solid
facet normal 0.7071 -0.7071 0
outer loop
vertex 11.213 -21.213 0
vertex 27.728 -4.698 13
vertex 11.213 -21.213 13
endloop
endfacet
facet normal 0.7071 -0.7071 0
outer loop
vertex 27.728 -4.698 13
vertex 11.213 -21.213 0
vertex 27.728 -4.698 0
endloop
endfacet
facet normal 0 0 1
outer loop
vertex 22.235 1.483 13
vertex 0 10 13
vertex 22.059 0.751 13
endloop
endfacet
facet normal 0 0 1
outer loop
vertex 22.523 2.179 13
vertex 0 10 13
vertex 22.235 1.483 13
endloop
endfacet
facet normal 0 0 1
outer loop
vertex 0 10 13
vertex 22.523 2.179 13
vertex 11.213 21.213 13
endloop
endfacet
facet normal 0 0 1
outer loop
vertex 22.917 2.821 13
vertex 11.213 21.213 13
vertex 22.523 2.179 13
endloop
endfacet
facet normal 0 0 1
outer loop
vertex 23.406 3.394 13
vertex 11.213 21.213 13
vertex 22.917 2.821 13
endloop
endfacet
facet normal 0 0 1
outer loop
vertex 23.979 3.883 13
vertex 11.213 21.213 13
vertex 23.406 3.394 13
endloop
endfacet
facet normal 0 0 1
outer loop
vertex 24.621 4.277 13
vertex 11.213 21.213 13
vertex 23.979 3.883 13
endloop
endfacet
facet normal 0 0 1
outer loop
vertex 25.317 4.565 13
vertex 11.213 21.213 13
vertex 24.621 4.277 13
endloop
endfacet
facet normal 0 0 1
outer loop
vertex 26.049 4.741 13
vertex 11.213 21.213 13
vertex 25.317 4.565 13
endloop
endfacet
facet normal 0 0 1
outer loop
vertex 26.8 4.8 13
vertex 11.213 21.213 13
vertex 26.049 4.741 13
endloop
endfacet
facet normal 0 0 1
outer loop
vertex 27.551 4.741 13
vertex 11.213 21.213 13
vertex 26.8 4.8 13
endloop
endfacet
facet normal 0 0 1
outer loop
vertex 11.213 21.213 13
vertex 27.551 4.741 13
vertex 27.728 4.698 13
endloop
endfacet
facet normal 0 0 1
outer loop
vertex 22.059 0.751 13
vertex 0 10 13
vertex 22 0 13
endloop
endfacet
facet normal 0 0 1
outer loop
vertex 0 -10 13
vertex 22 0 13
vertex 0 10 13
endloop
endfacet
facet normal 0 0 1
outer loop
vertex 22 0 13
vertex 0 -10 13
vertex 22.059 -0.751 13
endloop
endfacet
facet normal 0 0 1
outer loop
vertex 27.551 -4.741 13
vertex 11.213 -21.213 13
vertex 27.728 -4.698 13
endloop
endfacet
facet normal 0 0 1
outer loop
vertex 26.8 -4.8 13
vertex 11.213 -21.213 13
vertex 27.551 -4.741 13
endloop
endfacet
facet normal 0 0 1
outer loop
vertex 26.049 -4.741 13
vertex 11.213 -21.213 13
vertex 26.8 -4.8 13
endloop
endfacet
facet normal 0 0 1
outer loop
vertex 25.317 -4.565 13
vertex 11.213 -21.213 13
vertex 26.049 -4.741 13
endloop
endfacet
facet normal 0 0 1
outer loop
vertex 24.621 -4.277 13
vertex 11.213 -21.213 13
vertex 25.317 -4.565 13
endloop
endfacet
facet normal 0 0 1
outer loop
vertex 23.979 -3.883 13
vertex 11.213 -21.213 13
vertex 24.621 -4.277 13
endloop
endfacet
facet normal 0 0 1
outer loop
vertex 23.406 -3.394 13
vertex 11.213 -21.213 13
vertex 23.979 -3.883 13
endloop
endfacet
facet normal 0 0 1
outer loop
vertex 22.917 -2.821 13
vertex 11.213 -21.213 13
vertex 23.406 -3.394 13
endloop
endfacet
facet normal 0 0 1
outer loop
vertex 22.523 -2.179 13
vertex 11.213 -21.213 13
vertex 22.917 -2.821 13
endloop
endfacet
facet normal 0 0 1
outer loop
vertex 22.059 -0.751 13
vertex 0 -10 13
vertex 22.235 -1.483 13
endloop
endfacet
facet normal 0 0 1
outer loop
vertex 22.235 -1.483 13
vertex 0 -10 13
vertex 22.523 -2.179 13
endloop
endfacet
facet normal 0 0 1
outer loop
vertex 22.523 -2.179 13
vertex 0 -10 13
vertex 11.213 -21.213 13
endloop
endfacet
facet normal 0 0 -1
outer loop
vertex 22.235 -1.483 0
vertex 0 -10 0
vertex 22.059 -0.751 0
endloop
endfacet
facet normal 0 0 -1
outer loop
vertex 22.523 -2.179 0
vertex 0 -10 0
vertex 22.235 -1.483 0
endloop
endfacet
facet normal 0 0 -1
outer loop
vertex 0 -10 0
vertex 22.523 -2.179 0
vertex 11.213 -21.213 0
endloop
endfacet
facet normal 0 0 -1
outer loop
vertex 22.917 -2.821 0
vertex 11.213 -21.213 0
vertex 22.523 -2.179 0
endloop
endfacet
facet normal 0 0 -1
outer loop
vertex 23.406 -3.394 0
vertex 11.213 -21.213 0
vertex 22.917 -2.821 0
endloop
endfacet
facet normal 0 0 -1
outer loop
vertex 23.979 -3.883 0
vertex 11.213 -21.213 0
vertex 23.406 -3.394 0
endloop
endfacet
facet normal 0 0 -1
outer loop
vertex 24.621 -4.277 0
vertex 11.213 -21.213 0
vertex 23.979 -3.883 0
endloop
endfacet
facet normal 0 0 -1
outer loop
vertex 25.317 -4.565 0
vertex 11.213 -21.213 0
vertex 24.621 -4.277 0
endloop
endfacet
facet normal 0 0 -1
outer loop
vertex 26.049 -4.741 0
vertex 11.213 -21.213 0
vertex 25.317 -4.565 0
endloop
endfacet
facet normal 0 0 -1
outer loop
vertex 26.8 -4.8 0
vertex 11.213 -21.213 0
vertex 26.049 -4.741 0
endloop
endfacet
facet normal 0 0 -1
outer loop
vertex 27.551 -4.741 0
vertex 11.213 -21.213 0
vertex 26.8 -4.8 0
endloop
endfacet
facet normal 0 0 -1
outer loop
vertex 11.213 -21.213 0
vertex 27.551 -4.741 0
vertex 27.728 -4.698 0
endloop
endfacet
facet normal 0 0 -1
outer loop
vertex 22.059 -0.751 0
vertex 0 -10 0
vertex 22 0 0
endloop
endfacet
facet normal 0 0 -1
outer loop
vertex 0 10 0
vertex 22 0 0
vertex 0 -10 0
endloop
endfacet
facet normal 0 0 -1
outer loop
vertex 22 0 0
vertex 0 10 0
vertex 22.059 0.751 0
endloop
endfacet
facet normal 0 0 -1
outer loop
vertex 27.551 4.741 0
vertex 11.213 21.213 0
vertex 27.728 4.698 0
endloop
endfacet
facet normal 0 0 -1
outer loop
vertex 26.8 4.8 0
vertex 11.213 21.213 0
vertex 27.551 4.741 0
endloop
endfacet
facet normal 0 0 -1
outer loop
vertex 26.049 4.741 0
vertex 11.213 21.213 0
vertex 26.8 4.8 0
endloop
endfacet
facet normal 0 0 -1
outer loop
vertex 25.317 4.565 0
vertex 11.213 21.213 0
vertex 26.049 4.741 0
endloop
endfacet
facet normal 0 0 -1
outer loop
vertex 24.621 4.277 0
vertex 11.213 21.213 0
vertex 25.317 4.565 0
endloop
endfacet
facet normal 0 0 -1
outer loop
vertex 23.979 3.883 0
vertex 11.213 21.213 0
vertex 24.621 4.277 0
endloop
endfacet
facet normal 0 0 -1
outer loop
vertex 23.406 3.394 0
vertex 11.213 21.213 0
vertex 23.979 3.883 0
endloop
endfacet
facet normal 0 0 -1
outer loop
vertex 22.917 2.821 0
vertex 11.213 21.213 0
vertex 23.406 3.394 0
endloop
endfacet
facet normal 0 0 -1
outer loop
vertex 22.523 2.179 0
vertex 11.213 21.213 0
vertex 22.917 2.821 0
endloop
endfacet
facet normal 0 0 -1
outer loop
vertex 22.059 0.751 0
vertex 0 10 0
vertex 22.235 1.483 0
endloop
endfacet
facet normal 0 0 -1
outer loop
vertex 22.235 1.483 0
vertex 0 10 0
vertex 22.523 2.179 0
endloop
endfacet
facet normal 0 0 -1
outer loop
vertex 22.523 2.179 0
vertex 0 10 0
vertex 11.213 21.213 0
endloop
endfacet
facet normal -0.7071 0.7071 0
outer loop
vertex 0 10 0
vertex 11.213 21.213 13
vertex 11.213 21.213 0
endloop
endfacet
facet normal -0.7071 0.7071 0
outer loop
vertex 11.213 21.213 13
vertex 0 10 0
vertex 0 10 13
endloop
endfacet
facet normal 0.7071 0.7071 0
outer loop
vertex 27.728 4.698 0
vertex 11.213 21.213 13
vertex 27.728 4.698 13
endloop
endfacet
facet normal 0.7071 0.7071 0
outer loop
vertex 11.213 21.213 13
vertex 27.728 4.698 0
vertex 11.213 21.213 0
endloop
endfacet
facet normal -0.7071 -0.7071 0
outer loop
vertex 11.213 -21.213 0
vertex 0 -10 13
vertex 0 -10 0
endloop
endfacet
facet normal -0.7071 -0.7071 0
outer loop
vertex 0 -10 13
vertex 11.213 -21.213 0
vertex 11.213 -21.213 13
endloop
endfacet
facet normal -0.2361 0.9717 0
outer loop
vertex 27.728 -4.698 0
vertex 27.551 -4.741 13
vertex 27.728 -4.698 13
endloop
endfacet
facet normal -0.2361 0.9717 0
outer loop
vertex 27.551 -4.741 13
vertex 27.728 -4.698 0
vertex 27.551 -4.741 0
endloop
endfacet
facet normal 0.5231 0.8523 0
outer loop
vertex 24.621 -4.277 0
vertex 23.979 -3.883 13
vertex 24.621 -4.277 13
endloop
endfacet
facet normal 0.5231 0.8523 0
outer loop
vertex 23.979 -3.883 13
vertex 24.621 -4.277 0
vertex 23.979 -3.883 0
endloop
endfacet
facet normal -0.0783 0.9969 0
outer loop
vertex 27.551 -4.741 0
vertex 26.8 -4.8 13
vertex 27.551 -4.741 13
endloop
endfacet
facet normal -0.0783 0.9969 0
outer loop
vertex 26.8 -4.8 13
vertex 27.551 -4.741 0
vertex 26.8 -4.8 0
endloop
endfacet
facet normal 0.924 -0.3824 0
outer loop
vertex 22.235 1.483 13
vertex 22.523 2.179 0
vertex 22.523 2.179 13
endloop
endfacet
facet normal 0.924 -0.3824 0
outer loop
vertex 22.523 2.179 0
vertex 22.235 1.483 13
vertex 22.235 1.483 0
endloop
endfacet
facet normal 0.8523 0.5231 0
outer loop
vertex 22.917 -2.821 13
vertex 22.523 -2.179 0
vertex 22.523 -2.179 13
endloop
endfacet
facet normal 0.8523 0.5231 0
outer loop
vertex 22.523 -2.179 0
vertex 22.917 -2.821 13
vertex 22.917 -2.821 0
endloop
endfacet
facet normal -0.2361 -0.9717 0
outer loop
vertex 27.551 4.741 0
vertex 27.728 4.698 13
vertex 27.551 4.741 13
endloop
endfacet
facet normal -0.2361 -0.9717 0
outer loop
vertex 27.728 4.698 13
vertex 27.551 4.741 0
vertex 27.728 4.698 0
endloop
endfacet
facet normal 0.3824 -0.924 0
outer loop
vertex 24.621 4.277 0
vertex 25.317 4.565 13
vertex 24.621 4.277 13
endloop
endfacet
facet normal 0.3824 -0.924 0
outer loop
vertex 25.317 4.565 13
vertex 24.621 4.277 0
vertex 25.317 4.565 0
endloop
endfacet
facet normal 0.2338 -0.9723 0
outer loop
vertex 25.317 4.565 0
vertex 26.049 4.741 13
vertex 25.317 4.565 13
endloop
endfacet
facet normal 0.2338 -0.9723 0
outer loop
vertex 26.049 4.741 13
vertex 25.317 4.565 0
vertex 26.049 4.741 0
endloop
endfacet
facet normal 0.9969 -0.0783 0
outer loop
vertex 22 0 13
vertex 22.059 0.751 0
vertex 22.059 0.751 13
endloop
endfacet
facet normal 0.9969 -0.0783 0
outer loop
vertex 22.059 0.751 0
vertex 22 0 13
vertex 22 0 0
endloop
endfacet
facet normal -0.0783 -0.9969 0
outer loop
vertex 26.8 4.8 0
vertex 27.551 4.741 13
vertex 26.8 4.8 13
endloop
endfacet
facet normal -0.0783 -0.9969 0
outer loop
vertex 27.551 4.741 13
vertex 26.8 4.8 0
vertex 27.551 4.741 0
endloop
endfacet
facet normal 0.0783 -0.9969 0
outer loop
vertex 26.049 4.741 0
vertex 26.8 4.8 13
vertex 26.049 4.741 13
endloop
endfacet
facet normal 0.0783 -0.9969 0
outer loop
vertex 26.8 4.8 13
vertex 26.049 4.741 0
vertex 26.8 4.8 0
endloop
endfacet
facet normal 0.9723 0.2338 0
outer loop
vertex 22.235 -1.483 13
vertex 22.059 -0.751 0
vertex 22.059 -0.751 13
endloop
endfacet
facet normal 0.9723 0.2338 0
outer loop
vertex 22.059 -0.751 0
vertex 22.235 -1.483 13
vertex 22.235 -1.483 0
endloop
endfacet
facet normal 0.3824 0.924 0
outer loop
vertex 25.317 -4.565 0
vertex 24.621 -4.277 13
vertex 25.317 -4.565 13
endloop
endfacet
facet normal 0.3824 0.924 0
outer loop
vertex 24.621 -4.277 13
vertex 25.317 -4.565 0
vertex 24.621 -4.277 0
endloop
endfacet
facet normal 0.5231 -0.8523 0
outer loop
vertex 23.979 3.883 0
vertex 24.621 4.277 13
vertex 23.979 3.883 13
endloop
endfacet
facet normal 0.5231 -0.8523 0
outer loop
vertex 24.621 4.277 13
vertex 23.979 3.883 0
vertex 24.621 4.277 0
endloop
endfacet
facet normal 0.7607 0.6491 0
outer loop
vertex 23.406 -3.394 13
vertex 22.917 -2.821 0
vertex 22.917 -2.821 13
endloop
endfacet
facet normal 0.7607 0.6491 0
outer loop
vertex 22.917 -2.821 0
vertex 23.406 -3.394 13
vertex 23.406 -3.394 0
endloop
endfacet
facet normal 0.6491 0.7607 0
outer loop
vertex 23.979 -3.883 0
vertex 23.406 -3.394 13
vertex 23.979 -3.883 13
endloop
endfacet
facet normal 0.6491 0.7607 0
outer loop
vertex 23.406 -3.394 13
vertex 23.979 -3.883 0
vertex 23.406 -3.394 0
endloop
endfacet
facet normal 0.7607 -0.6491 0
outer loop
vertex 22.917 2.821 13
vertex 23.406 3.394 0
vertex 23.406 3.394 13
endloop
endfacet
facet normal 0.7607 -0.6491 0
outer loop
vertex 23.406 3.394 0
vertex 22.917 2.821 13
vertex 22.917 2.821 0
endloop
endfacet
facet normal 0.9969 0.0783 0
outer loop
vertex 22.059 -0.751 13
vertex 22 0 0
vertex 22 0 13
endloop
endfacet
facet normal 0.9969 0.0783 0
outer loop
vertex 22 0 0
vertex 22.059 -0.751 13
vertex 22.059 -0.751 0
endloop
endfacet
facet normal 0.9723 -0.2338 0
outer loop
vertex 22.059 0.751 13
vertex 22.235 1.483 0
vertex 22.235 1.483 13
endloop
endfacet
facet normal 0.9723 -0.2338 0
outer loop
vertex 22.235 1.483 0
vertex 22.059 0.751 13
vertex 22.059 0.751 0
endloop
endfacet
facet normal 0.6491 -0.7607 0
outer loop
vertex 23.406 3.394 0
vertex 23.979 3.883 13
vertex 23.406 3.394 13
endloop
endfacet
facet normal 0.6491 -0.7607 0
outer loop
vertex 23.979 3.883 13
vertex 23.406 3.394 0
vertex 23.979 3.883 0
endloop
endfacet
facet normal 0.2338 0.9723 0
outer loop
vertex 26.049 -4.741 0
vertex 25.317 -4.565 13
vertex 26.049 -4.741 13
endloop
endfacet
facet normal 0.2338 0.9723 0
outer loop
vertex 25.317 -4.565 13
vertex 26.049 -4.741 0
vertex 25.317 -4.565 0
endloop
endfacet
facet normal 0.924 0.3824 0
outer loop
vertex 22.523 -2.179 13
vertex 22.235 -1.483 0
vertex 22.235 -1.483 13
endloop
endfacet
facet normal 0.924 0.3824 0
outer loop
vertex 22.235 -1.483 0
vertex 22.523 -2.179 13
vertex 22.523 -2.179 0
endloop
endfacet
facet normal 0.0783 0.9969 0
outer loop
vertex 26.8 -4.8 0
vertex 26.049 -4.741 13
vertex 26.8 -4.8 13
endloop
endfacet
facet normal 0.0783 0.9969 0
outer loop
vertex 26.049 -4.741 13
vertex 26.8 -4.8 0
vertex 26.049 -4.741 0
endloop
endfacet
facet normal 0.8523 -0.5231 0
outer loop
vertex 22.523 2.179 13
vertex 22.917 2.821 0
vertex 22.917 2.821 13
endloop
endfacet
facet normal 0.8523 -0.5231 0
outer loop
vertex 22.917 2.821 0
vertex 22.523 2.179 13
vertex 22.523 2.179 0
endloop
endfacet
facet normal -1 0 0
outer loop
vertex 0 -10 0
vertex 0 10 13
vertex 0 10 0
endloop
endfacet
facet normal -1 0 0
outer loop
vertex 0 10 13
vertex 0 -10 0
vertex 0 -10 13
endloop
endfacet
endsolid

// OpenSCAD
difference(){
    translate([-10,0,0]) rotate([0,0,-45]) cube([30,30,13]);
    translate([4.8+22,0,-1]) cylinder(r=4.8,h=15,$fn=40);
    translate([4.8+24,0,-1]) cylinder(r=4.8,h=15,$fn=40);
    translate([-30,-15,-1]) cube([30,30,15]);
}
